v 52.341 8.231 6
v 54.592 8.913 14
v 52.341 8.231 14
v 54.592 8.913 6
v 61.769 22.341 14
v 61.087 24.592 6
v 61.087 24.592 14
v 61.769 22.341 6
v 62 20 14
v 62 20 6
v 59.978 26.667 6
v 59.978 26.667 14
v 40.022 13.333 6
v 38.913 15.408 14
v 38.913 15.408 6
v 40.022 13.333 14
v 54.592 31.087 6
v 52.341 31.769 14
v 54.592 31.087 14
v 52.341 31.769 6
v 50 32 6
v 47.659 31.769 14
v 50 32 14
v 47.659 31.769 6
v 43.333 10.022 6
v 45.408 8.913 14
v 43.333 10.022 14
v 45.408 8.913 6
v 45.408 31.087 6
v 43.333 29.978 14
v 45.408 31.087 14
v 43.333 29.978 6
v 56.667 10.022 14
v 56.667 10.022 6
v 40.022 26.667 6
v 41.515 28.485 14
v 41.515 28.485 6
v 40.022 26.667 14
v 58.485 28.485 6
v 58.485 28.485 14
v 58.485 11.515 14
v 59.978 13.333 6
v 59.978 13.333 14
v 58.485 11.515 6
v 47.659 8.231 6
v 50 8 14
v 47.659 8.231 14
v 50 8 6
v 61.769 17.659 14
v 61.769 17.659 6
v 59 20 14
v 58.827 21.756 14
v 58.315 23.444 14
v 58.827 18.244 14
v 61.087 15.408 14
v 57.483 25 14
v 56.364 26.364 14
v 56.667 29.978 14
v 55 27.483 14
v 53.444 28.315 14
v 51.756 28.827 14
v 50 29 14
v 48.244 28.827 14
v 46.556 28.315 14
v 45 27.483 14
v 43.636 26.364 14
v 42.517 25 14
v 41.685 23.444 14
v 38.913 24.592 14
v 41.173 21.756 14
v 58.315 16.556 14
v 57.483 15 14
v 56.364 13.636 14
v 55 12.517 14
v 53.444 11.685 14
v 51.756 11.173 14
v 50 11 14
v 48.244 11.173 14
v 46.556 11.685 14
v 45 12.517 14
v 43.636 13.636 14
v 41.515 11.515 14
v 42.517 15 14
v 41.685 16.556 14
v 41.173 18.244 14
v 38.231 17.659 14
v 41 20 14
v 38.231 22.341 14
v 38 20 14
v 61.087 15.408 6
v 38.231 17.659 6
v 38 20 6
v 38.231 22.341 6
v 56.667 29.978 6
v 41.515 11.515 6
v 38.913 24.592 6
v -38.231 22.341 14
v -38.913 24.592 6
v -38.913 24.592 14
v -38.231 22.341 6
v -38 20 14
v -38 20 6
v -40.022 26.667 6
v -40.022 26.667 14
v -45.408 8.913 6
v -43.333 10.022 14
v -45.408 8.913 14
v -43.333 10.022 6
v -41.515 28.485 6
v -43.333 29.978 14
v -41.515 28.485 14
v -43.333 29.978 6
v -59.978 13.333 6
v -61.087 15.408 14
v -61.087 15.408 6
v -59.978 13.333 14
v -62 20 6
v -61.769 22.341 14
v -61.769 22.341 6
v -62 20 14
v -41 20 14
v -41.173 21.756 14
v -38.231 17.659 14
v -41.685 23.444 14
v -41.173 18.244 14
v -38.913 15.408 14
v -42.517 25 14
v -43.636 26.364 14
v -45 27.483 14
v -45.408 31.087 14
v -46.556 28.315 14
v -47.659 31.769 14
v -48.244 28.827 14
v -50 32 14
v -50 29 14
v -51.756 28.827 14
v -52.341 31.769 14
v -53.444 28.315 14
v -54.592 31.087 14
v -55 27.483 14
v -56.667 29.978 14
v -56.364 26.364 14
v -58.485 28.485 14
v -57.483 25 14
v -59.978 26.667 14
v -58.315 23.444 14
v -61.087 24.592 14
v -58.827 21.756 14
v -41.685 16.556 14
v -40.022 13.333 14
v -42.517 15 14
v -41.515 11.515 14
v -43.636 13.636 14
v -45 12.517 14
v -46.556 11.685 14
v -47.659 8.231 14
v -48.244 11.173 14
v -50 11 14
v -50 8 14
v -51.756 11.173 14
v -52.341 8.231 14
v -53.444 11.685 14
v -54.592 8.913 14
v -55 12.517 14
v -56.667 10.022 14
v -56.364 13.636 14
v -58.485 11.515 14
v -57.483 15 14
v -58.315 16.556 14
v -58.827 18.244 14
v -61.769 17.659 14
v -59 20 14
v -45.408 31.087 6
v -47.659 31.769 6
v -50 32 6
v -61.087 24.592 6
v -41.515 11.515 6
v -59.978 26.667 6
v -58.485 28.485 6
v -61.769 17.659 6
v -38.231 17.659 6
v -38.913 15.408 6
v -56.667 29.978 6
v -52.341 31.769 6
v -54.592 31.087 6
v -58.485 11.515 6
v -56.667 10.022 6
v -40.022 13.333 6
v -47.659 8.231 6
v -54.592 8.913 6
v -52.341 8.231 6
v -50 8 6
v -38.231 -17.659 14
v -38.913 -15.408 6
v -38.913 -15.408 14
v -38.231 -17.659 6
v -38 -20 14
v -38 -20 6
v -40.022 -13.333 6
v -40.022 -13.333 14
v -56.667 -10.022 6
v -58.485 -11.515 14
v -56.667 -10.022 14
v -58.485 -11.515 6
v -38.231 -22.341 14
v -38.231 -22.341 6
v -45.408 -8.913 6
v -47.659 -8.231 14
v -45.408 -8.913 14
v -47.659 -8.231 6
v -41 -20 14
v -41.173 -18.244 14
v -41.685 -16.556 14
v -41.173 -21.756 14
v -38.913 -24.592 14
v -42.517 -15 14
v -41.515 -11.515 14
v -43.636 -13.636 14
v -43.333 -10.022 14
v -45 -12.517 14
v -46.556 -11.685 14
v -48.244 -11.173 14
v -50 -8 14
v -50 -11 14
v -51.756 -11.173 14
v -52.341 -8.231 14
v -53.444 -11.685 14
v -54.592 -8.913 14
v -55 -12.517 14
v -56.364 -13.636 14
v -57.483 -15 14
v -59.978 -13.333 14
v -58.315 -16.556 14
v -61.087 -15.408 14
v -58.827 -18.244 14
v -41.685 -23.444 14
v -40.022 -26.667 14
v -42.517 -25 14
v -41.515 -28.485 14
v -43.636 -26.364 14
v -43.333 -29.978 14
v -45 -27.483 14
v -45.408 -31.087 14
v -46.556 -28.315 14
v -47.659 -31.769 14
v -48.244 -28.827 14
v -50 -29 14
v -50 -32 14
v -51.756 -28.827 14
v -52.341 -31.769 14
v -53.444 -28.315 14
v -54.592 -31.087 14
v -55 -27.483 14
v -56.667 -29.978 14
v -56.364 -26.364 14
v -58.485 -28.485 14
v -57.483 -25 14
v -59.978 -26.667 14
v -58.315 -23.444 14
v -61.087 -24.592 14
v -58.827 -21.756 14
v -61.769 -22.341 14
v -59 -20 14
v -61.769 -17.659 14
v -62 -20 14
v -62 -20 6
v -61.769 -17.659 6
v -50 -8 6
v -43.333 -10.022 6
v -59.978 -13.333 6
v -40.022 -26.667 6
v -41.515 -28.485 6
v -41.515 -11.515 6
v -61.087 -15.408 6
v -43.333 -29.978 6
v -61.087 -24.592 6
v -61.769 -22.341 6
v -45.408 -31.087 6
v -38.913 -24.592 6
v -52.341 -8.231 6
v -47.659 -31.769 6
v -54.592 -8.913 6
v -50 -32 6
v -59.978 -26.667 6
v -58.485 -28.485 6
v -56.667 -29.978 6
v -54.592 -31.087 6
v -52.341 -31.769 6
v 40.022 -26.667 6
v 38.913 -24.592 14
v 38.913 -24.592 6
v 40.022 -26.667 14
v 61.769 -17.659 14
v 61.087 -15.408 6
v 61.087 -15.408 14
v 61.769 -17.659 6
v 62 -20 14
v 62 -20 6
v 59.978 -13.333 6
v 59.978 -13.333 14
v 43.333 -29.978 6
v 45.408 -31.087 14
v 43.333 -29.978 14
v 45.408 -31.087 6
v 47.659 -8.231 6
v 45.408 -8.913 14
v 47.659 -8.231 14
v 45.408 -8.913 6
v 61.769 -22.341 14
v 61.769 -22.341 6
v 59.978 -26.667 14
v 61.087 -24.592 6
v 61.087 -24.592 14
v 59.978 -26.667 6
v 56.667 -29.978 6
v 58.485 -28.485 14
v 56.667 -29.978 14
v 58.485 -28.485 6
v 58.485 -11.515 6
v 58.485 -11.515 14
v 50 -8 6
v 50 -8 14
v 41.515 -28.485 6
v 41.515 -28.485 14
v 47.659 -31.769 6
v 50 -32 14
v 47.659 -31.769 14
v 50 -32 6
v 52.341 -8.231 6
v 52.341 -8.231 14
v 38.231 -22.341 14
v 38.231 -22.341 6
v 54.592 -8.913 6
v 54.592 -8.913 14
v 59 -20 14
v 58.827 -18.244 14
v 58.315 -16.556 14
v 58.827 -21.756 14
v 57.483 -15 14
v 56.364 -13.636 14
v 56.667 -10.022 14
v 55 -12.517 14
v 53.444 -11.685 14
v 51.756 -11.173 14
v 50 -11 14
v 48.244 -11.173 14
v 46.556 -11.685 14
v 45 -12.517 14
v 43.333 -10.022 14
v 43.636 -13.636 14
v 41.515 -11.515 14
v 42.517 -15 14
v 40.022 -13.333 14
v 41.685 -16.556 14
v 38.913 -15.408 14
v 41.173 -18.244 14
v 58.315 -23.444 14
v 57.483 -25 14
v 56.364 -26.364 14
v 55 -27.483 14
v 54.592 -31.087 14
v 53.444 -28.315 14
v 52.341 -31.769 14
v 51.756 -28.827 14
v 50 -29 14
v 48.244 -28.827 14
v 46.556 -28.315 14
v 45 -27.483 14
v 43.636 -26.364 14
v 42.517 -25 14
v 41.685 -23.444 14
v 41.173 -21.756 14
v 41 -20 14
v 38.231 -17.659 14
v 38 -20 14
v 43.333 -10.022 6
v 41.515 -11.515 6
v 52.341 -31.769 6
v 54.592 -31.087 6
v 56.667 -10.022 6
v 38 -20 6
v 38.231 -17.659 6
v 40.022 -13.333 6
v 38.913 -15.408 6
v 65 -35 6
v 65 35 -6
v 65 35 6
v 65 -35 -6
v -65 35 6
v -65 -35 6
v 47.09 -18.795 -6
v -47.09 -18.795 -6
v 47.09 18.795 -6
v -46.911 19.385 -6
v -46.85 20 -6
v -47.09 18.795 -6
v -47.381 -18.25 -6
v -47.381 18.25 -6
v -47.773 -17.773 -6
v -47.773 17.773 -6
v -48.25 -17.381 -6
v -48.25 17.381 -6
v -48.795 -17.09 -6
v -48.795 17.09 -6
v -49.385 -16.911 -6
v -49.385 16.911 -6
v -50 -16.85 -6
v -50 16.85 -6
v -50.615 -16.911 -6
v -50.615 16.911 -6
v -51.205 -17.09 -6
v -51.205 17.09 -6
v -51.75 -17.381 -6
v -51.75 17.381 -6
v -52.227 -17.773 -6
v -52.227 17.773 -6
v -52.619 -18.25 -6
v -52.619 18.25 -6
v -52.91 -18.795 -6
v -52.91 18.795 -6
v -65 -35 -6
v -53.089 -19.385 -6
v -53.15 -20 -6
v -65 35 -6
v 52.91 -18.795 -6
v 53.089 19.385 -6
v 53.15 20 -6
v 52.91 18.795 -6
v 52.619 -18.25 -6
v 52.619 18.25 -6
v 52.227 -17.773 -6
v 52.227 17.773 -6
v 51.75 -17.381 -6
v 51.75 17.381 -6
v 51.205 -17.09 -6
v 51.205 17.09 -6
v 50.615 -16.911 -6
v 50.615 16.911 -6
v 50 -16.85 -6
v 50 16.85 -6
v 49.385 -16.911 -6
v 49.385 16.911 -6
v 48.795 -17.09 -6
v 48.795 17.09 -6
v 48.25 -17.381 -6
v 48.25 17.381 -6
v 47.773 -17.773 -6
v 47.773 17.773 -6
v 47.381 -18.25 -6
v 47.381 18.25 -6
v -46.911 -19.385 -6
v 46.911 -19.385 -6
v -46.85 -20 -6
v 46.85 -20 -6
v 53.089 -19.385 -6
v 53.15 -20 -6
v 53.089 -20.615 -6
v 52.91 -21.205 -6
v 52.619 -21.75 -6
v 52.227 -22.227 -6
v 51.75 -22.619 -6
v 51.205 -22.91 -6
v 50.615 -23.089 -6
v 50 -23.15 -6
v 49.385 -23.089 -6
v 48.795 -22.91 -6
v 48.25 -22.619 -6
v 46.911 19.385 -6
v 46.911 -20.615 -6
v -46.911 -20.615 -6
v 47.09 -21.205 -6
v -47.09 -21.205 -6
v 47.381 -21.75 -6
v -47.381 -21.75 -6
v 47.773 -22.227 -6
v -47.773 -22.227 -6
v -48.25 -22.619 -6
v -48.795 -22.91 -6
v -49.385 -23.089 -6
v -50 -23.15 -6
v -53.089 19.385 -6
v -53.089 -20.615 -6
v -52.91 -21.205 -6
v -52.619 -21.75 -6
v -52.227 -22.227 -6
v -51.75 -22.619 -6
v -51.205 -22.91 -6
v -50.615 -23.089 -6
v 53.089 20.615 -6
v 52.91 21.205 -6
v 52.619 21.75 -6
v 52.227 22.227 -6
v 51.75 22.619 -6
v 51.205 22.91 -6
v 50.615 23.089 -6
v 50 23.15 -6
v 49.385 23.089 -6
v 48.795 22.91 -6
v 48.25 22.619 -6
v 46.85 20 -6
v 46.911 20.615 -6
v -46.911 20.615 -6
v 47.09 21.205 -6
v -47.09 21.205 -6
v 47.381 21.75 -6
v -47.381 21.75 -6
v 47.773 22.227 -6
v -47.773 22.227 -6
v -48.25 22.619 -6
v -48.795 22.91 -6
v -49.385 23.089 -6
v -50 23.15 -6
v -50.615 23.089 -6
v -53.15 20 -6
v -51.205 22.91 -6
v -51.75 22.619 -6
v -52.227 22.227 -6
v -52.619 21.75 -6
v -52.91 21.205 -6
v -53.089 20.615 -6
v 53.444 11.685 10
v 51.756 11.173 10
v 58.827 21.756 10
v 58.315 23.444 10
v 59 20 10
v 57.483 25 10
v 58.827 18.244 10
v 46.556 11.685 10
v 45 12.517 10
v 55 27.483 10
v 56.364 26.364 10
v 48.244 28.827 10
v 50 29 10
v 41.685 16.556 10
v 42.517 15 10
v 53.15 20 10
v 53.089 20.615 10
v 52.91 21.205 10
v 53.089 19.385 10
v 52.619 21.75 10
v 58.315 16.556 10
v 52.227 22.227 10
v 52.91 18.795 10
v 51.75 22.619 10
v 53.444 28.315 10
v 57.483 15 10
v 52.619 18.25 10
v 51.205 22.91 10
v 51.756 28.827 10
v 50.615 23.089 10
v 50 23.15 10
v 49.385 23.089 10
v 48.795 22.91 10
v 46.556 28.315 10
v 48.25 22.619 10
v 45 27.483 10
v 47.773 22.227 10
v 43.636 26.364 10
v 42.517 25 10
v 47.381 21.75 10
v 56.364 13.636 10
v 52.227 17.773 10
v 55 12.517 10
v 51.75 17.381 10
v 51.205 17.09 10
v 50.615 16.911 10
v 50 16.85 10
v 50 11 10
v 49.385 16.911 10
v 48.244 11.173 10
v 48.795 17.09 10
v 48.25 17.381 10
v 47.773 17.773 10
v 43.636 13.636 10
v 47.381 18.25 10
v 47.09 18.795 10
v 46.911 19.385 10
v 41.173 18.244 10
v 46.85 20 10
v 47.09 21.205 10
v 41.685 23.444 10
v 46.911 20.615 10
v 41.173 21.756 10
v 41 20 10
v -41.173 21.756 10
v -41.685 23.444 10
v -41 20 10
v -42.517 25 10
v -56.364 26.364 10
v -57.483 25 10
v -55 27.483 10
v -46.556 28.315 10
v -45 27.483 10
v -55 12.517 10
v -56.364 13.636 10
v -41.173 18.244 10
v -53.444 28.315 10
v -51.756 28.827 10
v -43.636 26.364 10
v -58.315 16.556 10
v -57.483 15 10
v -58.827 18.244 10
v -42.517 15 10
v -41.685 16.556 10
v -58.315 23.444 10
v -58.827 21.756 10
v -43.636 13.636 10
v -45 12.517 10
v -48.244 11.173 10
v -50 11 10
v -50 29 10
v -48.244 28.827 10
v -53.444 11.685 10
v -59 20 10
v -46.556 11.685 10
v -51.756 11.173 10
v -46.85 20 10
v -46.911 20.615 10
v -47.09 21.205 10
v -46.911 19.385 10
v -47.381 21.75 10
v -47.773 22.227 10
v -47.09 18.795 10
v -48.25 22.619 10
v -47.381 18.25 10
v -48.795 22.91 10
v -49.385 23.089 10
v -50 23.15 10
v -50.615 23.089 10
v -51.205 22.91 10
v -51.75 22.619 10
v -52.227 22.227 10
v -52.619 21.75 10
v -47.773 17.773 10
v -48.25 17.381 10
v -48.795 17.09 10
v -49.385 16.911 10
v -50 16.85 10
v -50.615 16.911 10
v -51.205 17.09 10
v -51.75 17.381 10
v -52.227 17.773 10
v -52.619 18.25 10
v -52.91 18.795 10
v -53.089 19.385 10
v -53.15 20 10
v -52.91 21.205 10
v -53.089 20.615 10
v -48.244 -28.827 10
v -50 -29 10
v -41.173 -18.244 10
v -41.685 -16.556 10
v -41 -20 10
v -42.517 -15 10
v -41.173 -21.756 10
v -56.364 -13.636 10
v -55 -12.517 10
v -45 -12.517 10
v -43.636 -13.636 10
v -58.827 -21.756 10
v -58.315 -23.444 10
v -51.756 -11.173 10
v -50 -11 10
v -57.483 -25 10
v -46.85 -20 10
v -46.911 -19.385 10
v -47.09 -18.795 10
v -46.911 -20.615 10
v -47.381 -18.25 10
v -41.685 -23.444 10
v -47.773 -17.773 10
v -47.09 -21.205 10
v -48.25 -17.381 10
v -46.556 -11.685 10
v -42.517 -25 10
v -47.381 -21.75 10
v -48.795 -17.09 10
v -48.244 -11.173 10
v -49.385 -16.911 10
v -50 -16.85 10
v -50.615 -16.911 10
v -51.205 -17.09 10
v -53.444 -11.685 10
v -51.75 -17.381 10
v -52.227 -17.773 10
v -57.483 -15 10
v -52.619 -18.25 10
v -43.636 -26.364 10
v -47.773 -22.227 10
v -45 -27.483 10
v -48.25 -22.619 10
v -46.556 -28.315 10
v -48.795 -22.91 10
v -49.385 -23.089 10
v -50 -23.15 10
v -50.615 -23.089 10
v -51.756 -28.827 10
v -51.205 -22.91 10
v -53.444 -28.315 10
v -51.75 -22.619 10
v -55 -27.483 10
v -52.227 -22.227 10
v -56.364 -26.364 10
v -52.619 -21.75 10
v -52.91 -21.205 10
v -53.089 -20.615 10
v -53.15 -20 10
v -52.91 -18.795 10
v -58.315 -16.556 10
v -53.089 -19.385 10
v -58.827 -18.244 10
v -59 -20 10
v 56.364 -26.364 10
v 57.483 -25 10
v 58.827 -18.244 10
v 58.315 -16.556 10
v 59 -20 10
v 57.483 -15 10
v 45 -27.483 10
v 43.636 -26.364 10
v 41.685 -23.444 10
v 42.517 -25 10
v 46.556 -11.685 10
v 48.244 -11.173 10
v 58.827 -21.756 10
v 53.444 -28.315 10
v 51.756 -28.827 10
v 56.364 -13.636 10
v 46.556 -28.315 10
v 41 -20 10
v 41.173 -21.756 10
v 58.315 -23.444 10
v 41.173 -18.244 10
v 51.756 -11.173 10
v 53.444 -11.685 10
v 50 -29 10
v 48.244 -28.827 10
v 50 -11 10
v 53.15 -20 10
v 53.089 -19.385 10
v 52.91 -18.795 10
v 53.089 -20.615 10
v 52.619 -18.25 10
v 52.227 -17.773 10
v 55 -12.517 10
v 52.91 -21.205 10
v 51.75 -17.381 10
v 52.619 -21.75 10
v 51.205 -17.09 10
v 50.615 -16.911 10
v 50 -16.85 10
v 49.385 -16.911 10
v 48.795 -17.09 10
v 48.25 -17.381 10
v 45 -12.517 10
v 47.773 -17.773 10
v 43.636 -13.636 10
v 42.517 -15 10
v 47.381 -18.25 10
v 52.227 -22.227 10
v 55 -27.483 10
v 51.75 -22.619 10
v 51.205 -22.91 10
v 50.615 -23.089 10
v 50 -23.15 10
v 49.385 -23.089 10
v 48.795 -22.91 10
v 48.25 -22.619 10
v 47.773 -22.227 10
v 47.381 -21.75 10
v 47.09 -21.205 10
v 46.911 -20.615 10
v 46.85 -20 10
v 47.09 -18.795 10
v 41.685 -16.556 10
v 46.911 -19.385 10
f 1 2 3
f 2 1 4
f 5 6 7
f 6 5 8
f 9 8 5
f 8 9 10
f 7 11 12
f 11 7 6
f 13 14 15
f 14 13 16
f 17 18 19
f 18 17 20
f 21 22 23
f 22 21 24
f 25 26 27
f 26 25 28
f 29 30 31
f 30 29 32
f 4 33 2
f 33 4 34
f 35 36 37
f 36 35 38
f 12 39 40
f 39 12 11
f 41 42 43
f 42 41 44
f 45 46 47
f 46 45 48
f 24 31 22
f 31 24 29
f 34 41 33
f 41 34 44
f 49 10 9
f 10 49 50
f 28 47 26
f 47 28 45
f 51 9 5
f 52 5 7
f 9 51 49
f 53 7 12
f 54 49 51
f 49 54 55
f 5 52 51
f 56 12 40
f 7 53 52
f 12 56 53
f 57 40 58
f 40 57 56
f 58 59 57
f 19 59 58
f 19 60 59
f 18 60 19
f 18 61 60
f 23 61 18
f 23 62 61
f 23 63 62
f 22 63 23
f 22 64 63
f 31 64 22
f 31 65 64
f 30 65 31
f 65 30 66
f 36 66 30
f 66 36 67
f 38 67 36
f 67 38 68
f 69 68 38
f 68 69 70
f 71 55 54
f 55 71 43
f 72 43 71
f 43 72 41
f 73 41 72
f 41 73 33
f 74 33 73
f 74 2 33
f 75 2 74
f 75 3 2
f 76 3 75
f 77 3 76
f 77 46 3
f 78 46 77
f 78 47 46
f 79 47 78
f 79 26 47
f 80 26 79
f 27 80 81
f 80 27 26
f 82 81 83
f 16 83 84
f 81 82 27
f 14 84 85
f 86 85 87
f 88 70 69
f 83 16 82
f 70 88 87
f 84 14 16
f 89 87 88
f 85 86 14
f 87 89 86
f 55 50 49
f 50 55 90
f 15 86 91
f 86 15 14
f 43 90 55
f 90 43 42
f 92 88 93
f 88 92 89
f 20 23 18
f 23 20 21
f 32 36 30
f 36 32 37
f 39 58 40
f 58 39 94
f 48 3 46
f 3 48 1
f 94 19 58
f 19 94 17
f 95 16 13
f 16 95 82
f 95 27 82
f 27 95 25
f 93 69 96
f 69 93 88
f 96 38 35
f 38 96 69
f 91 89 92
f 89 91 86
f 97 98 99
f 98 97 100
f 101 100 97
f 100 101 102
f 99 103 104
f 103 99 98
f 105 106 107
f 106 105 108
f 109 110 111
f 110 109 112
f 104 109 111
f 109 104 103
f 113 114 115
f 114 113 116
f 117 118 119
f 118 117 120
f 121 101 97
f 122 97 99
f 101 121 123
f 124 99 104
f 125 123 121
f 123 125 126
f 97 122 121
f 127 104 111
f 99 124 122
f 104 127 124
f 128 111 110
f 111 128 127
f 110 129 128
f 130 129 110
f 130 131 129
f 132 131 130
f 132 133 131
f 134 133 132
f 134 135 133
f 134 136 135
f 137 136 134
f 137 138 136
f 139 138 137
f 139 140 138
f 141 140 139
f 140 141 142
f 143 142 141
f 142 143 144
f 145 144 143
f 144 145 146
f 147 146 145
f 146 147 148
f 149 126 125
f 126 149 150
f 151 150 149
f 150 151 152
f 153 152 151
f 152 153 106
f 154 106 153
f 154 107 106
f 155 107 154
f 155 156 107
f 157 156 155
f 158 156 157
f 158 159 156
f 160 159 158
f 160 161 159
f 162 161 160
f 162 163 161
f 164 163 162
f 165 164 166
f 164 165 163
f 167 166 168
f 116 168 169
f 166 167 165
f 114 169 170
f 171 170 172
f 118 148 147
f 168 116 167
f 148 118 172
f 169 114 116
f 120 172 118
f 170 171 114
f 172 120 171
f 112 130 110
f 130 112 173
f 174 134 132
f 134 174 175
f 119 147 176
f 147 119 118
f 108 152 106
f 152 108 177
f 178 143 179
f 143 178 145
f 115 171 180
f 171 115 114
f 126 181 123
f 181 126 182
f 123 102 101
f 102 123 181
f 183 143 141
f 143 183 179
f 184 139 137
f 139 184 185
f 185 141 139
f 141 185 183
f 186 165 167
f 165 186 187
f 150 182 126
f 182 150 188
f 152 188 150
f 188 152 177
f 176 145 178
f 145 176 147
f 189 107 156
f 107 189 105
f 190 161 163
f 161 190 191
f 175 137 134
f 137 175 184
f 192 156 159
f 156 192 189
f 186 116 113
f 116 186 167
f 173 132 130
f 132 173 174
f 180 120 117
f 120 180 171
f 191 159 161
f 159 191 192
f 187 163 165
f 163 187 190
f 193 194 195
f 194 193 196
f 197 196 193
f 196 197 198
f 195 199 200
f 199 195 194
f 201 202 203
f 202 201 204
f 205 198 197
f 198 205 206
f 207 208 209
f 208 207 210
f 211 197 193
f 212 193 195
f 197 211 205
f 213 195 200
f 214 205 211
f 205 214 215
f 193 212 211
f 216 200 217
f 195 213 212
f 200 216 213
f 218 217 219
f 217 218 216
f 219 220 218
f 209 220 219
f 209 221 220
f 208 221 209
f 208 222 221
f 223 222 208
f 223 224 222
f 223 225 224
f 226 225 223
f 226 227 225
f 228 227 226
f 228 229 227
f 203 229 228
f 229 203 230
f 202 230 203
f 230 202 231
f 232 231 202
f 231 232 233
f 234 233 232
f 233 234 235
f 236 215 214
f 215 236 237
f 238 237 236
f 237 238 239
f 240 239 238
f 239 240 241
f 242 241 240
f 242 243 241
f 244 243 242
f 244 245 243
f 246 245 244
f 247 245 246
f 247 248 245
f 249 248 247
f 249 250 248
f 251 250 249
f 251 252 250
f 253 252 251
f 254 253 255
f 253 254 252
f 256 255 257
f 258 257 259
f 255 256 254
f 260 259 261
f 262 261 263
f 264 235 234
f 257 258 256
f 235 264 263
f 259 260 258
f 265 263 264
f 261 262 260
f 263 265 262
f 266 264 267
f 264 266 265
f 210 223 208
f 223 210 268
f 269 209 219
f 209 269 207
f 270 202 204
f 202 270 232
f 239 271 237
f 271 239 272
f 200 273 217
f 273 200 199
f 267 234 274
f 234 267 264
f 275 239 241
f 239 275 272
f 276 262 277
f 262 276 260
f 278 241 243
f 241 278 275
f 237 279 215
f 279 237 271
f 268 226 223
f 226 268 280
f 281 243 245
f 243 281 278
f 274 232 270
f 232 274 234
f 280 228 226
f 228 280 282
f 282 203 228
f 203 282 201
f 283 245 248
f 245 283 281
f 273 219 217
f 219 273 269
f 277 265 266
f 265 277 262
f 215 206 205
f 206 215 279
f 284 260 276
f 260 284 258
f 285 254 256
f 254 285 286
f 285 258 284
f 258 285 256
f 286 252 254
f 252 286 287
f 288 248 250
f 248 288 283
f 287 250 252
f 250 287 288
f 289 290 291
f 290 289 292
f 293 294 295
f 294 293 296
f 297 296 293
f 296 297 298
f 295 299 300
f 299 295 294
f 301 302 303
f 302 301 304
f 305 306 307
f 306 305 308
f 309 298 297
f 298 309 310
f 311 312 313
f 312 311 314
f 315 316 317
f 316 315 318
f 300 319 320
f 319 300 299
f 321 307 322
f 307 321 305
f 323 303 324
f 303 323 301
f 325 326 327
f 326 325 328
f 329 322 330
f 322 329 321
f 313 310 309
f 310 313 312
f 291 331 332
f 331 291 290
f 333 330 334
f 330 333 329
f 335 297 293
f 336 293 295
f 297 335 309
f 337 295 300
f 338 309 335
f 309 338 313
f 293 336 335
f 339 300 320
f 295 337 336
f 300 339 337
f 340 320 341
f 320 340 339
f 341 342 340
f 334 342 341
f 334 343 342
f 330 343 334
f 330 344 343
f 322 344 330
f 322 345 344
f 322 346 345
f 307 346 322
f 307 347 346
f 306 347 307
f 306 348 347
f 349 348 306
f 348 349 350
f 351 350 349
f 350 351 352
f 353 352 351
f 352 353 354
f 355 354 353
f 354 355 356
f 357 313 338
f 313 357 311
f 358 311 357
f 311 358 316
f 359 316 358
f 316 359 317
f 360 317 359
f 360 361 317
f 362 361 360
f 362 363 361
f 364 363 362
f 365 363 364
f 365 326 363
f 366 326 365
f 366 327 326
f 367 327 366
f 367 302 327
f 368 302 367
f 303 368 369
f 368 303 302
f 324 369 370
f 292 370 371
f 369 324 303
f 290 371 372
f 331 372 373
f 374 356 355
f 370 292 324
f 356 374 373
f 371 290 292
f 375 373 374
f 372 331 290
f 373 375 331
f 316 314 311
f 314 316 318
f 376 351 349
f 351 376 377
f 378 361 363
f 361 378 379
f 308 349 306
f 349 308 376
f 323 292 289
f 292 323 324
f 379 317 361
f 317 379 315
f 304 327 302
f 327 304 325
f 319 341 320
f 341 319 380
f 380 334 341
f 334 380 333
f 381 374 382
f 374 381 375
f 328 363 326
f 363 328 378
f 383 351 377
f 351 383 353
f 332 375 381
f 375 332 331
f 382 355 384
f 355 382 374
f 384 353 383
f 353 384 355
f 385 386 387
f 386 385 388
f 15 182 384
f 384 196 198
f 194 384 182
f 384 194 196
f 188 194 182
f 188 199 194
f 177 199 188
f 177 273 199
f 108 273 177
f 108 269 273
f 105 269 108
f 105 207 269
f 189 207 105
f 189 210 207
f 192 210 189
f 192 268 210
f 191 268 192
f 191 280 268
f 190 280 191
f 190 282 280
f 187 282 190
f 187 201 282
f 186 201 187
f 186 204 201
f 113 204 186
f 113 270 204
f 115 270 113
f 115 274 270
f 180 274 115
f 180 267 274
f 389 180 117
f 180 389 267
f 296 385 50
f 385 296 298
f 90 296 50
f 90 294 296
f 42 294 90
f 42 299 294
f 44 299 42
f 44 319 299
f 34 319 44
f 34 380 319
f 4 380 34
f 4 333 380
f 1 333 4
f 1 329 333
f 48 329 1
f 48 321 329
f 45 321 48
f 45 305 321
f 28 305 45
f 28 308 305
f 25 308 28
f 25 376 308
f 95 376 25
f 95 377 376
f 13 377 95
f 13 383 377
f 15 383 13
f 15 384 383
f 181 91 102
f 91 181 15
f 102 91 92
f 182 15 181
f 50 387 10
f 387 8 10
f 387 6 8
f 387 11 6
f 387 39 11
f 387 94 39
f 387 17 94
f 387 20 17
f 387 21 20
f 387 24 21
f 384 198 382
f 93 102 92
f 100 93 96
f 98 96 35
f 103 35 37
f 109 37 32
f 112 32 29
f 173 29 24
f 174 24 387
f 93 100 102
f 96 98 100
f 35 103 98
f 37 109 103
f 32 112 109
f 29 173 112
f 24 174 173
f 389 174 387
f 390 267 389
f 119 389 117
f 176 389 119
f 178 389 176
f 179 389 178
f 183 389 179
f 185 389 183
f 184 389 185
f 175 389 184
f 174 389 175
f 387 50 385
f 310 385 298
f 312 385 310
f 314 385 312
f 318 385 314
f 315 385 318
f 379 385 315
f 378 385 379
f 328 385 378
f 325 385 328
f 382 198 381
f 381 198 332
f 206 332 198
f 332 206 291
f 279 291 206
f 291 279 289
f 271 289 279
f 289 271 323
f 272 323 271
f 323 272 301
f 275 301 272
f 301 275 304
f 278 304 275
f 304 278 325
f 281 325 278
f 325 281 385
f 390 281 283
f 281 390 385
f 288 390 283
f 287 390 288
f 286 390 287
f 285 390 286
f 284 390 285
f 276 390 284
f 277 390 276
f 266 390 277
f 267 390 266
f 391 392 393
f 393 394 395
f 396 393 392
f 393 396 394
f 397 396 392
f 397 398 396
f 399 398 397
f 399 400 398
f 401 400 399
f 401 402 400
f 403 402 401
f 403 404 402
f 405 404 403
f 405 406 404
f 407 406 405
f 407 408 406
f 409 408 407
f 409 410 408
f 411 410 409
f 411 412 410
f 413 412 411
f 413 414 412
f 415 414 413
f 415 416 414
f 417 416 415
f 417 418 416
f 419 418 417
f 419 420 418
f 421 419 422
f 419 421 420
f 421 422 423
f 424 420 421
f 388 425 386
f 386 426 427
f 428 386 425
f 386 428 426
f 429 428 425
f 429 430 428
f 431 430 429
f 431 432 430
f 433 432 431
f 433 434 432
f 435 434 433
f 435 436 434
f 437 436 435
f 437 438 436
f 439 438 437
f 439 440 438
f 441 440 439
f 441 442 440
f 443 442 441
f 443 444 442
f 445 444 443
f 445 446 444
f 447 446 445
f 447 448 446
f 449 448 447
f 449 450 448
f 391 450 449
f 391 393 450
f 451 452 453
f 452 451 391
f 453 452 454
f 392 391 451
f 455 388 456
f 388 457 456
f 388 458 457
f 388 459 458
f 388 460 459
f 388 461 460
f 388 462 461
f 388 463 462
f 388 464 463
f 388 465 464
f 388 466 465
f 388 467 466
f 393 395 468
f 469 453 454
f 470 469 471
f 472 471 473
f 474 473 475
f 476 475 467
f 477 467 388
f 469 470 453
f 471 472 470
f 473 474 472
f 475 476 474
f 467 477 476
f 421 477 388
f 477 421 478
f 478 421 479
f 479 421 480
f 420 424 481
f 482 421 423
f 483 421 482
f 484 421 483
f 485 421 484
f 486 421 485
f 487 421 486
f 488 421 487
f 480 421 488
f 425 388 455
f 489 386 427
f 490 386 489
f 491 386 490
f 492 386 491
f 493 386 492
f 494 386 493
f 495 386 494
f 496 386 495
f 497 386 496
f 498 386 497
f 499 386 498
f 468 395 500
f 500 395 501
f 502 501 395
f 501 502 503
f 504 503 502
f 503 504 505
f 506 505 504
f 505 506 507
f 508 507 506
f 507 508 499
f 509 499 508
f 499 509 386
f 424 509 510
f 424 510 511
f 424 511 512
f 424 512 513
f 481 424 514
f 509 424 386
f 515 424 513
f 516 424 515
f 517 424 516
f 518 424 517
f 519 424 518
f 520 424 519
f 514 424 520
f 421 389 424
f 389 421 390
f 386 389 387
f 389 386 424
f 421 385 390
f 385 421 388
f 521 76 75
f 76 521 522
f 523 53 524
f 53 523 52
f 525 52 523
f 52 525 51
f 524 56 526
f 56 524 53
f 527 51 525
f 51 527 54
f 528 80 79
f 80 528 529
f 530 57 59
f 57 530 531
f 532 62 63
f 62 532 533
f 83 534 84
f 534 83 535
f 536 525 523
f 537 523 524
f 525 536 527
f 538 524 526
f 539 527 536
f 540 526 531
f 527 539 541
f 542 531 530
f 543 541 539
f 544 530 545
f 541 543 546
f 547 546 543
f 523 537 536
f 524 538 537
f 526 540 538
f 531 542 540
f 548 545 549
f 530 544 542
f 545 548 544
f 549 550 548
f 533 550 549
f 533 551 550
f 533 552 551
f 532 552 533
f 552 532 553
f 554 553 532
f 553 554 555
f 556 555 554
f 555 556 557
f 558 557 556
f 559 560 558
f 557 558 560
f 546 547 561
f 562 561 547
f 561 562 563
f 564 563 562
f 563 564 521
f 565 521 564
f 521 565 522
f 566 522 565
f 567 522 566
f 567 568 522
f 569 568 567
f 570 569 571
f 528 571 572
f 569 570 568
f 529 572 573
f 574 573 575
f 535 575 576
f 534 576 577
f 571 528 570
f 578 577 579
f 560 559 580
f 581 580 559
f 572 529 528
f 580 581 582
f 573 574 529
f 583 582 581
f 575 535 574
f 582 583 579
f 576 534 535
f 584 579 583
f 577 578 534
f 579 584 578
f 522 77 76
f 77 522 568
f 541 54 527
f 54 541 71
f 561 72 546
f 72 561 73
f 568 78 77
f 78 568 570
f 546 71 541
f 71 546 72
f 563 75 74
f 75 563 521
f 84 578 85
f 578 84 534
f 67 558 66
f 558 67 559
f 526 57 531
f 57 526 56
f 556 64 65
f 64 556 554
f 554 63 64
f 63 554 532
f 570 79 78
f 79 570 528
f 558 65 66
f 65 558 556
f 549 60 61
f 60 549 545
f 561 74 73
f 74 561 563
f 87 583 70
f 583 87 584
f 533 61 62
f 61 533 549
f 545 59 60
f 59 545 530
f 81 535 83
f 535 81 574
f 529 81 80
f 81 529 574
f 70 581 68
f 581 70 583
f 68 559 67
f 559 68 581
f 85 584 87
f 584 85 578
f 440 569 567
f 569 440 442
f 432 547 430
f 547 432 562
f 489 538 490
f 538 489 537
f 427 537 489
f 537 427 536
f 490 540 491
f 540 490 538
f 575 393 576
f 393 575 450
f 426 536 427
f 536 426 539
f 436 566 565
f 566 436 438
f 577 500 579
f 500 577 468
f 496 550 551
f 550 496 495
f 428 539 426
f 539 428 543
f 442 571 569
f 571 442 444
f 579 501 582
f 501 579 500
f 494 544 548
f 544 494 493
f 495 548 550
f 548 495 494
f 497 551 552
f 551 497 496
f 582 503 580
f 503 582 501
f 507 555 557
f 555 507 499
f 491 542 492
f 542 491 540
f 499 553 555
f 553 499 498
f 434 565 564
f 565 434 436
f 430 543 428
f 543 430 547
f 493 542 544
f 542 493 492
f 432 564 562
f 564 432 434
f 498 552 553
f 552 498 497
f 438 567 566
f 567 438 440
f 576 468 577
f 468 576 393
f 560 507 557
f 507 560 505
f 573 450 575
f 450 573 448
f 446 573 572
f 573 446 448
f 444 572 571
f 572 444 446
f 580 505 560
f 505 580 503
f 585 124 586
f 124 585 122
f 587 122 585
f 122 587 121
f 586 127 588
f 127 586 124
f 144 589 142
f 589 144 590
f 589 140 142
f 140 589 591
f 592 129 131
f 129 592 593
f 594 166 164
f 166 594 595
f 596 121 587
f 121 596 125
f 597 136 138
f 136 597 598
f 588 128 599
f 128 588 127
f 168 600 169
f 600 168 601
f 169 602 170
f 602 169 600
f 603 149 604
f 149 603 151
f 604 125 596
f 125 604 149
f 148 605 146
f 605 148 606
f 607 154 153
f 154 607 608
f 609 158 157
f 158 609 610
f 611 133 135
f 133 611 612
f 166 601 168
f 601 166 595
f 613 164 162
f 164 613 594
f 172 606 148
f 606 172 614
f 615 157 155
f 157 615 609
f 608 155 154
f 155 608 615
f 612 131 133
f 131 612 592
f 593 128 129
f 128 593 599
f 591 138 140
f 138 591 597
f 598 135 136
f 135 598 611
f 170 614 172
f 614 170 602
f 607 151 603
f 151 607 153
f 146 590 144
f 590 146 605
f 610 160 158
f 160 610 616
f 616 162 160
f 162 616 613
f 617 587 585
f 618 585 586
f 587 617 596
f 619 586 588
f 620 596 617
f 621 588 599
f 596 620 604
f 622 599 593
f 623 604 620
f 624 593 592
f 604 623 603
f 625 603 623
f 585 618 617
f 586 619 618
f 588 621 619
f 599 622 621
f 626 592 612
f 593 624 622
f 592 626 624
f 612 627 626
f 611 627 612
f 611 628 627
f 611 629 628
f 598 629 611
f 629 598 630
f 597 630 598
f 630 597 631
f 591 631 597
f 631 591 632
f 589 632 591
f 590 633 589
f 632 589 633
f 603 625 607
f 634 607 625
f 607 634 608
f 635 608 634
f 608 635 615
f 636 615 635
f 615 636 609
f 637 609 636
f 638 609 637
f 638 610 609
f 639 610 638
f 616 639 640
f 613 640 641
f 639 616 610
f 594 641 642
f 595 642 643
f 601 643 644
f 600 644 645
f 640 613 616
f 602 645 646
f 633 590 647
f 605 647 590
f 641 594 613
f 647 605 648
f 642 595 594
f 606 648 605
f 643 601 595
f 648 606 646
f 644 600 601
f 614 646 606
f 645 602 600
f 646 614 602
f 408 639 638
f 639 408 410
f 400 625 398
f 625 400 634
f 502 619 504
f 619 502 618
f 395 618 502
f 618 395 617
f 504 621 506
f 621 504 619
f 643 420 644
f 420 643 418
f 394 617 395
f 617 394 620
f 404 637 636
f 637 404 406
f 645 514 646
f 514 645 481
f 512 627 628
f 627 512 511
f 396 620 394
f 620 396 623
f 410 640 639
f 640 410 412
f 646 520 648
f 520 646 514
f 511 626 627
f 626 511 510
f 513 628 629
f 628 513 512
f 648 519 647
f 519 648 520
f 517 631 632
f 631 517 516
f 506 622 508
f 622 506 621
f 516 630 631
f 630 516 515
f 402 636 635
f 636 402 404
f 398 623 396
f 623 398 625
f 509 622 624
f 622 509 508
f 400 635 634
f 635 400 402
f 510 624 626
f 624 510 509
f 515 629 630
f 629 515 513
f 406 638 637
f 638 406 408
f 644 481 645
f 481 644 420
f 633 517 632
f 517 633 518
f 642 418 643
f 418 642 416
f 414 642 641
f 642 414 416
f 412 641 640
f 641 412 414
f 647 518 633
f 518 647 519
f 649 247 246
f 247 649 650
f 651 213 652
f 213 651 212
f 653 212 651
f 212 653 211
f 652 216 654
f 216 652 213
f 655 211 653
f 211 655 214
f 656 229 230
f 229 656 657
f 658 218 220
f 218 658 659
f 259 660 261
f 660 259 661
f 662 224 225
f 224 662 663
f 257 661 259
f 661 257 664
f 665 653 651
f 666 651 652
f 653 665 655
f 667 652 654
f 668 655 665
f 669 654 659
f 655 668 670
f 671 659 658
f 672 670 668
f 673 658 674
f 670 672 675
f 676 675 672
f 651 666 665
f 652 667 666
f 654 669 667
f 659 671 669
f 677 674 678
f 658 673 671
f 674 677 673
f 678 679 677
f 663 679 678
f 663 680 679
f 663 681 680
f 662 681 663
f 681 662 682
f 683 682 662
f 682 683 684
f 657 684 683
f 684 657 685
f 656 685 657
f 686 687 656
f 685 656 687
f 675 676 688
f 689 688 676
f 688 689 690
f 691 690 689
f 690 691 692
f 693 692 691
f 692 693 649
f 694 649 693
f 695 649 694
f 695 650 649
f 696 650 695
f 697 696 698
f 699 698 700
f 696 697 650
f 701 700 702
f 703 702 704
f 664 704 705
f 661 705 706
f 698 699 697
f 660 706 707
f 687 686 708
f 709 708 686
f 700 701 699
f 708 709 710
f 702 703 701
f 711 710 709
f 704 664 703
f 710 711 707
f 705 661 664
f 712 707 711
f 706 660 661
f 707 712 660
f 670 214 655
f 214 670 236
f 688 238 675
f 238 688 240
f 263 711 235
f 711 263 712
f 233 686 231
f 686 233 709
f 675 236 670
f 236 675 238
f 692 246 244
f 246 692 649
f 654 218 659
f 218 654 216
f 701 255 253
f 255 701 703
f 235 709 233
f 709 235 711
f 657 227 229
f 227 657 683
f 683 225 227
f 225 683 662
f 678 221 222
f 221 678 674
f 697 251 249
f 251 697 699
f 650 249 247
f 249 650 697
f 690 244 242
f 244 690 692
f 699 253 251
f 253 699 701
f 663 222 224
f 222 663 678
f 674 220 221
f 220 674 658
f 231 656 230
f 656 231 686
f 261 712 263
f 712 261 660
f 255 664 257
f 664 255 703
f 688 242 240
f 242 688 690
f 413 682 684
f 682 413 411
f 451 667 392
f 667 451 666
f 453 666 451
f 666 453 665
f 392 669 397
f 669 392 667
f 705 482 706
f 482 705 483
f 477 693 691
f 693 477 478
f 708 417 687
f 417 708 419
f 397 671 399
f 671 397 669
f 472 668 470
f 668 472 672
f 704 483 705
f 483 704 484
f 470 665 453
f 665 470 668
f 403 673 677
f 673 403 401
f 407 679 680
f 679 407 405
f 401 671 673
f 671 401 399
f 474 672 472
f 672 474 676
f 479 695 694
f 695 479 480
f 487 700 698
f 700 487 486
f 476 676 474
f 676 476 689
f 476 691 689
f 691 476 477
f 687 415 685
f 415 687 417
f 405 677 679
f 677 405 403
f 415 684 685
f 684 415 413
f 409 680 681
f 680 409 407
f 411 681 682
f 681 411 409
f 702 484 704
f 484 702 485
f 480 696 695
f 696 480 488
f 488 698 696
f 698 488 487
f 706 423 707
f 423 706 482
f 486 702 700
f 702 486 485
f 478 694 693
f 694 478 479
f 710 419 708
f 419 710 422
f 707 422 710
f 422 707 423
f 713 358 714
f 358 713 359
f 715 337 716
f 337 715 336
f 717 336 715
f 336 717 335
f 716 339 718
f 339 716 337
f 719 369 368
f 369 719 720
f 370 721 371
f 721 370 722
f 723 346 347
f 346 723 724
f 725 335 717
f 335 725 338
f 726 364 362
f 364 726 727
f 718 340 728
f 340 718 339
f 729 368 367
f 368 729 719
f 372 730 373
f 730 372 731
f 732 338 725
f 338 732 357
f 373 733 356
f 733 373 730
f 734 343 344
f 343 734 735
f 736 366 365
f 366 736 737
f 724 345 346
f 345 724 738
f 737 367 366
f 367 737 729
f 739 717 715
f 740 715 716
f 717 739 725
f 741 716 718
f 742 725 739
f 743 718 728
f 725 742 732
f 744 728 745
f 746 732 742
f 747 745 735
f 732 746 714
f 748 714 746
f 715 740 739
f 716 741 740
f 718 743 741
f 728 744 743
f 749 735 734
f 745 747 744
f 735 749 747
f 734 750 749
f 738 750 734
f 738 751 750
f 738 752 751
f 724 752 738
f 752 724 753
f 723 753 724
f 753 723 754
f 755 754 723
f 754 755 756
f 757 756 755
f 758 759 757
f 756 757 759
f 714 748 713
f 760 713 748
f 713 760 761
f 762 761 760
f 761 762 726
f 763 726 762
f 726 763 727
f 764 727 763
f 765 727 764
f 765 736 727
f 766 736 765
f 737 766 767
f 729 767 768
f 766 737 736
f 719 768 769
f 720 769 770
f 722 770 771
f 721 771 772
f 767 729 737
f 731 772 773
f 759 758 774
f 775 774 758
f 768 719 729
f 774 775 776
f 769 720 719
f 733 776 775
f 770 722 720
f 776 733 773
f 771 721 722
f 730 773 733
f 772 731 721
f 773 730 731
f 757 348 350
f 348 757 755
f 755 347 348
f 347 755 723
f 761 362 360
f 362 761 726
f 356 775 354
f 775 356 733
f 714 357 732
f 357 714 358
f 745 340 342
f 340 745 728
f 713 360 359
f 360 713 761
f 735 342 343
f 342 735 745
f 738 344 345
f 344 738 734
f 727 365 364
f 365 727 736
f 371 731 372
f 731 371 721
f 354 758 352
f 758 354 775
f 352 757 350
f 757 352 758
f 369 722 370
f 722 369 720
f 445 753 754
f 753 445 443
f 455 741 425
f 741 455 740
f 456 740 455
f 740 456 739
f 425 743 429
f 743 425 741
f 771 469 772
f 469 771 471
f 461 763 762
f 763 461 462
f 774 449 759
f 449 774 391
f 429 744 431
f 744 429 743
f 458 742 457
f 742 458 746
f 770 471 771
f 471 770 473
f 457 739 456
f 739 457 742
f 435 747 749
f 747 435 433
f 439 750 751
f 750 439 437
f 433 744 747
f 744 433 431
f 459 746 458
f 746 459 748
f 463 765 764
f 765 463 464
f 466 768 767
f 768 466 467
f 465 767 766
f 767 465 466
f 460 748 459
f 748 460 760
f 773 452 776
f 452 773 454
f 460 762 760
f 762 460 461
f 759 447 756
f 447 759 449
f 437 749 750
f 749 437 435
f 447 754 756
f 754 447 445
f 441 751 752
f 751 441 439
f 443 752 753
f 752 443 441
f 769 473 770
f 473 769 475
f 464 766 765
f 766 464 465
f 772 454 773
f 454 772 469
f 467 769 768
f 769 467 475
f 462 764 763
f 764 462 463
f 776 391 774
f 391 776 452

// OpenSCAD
$fn = 32;

// ----------------------------------------------------------------------
// Socket pad plate
// bosses with counterbored sockets for the screws
// ----------------------------------------------------------------------

// --- parameters (mm) ---
base_t = 12;            // base plate thickness
boss_h = 8;             // boss height above the base plate
boss_d = 24;            // boss diameter
socket_d = 18;          // socket diameter
socket_depth = 4;       // socket depth from the boss face
bolt_d = 6.3;           // screw clearance hole through the socket floor
plate = [130, 70, 12];  // overall size (x, y, z)
edge = 15;              // boss centre offset from the plate edge
pads = 4;               // boss count, one per corner

// --- derived feature positions (mm) ---
height = base_t + boss_h;        // = 20   overall height of the part
corner_x = plate[0] / 2 - edge;  // = 50   boss centre X
corner_y = plate[1] / 2 - edge;  // = 20   boss centre Y
feature_centers = [
  [corner_x, corner_y],
  [-corner_x, corner_y],
  [-corner_x, -corner_y],
  [corner_x, -corner_y]
];   // boss centres: sockets, holes and the pads themselves are placed from here

// base plate, bosses on feature_centers, socket + through hole in each
difference() {
  union() {
    cube(plate, center = true);
    for (centre = feature_centers)
      translate([centre[0], centre[1], plate[2] / 2 - 1])
        cylinder(d = boss_d, h = boss_h + 1);
  }
  for (centre = feature_centers) {
    translate([centre[0], centre[1], plate[2] / 2 + boss_h - socket_depth])
      cylinder(d = socket_d, h = socket_depth + 1);
    translate([centre[0], centre[1], -height])
      cylinder(d = bolt_d, h = 2 * height + 2);  // through the socket floor
  }
}
